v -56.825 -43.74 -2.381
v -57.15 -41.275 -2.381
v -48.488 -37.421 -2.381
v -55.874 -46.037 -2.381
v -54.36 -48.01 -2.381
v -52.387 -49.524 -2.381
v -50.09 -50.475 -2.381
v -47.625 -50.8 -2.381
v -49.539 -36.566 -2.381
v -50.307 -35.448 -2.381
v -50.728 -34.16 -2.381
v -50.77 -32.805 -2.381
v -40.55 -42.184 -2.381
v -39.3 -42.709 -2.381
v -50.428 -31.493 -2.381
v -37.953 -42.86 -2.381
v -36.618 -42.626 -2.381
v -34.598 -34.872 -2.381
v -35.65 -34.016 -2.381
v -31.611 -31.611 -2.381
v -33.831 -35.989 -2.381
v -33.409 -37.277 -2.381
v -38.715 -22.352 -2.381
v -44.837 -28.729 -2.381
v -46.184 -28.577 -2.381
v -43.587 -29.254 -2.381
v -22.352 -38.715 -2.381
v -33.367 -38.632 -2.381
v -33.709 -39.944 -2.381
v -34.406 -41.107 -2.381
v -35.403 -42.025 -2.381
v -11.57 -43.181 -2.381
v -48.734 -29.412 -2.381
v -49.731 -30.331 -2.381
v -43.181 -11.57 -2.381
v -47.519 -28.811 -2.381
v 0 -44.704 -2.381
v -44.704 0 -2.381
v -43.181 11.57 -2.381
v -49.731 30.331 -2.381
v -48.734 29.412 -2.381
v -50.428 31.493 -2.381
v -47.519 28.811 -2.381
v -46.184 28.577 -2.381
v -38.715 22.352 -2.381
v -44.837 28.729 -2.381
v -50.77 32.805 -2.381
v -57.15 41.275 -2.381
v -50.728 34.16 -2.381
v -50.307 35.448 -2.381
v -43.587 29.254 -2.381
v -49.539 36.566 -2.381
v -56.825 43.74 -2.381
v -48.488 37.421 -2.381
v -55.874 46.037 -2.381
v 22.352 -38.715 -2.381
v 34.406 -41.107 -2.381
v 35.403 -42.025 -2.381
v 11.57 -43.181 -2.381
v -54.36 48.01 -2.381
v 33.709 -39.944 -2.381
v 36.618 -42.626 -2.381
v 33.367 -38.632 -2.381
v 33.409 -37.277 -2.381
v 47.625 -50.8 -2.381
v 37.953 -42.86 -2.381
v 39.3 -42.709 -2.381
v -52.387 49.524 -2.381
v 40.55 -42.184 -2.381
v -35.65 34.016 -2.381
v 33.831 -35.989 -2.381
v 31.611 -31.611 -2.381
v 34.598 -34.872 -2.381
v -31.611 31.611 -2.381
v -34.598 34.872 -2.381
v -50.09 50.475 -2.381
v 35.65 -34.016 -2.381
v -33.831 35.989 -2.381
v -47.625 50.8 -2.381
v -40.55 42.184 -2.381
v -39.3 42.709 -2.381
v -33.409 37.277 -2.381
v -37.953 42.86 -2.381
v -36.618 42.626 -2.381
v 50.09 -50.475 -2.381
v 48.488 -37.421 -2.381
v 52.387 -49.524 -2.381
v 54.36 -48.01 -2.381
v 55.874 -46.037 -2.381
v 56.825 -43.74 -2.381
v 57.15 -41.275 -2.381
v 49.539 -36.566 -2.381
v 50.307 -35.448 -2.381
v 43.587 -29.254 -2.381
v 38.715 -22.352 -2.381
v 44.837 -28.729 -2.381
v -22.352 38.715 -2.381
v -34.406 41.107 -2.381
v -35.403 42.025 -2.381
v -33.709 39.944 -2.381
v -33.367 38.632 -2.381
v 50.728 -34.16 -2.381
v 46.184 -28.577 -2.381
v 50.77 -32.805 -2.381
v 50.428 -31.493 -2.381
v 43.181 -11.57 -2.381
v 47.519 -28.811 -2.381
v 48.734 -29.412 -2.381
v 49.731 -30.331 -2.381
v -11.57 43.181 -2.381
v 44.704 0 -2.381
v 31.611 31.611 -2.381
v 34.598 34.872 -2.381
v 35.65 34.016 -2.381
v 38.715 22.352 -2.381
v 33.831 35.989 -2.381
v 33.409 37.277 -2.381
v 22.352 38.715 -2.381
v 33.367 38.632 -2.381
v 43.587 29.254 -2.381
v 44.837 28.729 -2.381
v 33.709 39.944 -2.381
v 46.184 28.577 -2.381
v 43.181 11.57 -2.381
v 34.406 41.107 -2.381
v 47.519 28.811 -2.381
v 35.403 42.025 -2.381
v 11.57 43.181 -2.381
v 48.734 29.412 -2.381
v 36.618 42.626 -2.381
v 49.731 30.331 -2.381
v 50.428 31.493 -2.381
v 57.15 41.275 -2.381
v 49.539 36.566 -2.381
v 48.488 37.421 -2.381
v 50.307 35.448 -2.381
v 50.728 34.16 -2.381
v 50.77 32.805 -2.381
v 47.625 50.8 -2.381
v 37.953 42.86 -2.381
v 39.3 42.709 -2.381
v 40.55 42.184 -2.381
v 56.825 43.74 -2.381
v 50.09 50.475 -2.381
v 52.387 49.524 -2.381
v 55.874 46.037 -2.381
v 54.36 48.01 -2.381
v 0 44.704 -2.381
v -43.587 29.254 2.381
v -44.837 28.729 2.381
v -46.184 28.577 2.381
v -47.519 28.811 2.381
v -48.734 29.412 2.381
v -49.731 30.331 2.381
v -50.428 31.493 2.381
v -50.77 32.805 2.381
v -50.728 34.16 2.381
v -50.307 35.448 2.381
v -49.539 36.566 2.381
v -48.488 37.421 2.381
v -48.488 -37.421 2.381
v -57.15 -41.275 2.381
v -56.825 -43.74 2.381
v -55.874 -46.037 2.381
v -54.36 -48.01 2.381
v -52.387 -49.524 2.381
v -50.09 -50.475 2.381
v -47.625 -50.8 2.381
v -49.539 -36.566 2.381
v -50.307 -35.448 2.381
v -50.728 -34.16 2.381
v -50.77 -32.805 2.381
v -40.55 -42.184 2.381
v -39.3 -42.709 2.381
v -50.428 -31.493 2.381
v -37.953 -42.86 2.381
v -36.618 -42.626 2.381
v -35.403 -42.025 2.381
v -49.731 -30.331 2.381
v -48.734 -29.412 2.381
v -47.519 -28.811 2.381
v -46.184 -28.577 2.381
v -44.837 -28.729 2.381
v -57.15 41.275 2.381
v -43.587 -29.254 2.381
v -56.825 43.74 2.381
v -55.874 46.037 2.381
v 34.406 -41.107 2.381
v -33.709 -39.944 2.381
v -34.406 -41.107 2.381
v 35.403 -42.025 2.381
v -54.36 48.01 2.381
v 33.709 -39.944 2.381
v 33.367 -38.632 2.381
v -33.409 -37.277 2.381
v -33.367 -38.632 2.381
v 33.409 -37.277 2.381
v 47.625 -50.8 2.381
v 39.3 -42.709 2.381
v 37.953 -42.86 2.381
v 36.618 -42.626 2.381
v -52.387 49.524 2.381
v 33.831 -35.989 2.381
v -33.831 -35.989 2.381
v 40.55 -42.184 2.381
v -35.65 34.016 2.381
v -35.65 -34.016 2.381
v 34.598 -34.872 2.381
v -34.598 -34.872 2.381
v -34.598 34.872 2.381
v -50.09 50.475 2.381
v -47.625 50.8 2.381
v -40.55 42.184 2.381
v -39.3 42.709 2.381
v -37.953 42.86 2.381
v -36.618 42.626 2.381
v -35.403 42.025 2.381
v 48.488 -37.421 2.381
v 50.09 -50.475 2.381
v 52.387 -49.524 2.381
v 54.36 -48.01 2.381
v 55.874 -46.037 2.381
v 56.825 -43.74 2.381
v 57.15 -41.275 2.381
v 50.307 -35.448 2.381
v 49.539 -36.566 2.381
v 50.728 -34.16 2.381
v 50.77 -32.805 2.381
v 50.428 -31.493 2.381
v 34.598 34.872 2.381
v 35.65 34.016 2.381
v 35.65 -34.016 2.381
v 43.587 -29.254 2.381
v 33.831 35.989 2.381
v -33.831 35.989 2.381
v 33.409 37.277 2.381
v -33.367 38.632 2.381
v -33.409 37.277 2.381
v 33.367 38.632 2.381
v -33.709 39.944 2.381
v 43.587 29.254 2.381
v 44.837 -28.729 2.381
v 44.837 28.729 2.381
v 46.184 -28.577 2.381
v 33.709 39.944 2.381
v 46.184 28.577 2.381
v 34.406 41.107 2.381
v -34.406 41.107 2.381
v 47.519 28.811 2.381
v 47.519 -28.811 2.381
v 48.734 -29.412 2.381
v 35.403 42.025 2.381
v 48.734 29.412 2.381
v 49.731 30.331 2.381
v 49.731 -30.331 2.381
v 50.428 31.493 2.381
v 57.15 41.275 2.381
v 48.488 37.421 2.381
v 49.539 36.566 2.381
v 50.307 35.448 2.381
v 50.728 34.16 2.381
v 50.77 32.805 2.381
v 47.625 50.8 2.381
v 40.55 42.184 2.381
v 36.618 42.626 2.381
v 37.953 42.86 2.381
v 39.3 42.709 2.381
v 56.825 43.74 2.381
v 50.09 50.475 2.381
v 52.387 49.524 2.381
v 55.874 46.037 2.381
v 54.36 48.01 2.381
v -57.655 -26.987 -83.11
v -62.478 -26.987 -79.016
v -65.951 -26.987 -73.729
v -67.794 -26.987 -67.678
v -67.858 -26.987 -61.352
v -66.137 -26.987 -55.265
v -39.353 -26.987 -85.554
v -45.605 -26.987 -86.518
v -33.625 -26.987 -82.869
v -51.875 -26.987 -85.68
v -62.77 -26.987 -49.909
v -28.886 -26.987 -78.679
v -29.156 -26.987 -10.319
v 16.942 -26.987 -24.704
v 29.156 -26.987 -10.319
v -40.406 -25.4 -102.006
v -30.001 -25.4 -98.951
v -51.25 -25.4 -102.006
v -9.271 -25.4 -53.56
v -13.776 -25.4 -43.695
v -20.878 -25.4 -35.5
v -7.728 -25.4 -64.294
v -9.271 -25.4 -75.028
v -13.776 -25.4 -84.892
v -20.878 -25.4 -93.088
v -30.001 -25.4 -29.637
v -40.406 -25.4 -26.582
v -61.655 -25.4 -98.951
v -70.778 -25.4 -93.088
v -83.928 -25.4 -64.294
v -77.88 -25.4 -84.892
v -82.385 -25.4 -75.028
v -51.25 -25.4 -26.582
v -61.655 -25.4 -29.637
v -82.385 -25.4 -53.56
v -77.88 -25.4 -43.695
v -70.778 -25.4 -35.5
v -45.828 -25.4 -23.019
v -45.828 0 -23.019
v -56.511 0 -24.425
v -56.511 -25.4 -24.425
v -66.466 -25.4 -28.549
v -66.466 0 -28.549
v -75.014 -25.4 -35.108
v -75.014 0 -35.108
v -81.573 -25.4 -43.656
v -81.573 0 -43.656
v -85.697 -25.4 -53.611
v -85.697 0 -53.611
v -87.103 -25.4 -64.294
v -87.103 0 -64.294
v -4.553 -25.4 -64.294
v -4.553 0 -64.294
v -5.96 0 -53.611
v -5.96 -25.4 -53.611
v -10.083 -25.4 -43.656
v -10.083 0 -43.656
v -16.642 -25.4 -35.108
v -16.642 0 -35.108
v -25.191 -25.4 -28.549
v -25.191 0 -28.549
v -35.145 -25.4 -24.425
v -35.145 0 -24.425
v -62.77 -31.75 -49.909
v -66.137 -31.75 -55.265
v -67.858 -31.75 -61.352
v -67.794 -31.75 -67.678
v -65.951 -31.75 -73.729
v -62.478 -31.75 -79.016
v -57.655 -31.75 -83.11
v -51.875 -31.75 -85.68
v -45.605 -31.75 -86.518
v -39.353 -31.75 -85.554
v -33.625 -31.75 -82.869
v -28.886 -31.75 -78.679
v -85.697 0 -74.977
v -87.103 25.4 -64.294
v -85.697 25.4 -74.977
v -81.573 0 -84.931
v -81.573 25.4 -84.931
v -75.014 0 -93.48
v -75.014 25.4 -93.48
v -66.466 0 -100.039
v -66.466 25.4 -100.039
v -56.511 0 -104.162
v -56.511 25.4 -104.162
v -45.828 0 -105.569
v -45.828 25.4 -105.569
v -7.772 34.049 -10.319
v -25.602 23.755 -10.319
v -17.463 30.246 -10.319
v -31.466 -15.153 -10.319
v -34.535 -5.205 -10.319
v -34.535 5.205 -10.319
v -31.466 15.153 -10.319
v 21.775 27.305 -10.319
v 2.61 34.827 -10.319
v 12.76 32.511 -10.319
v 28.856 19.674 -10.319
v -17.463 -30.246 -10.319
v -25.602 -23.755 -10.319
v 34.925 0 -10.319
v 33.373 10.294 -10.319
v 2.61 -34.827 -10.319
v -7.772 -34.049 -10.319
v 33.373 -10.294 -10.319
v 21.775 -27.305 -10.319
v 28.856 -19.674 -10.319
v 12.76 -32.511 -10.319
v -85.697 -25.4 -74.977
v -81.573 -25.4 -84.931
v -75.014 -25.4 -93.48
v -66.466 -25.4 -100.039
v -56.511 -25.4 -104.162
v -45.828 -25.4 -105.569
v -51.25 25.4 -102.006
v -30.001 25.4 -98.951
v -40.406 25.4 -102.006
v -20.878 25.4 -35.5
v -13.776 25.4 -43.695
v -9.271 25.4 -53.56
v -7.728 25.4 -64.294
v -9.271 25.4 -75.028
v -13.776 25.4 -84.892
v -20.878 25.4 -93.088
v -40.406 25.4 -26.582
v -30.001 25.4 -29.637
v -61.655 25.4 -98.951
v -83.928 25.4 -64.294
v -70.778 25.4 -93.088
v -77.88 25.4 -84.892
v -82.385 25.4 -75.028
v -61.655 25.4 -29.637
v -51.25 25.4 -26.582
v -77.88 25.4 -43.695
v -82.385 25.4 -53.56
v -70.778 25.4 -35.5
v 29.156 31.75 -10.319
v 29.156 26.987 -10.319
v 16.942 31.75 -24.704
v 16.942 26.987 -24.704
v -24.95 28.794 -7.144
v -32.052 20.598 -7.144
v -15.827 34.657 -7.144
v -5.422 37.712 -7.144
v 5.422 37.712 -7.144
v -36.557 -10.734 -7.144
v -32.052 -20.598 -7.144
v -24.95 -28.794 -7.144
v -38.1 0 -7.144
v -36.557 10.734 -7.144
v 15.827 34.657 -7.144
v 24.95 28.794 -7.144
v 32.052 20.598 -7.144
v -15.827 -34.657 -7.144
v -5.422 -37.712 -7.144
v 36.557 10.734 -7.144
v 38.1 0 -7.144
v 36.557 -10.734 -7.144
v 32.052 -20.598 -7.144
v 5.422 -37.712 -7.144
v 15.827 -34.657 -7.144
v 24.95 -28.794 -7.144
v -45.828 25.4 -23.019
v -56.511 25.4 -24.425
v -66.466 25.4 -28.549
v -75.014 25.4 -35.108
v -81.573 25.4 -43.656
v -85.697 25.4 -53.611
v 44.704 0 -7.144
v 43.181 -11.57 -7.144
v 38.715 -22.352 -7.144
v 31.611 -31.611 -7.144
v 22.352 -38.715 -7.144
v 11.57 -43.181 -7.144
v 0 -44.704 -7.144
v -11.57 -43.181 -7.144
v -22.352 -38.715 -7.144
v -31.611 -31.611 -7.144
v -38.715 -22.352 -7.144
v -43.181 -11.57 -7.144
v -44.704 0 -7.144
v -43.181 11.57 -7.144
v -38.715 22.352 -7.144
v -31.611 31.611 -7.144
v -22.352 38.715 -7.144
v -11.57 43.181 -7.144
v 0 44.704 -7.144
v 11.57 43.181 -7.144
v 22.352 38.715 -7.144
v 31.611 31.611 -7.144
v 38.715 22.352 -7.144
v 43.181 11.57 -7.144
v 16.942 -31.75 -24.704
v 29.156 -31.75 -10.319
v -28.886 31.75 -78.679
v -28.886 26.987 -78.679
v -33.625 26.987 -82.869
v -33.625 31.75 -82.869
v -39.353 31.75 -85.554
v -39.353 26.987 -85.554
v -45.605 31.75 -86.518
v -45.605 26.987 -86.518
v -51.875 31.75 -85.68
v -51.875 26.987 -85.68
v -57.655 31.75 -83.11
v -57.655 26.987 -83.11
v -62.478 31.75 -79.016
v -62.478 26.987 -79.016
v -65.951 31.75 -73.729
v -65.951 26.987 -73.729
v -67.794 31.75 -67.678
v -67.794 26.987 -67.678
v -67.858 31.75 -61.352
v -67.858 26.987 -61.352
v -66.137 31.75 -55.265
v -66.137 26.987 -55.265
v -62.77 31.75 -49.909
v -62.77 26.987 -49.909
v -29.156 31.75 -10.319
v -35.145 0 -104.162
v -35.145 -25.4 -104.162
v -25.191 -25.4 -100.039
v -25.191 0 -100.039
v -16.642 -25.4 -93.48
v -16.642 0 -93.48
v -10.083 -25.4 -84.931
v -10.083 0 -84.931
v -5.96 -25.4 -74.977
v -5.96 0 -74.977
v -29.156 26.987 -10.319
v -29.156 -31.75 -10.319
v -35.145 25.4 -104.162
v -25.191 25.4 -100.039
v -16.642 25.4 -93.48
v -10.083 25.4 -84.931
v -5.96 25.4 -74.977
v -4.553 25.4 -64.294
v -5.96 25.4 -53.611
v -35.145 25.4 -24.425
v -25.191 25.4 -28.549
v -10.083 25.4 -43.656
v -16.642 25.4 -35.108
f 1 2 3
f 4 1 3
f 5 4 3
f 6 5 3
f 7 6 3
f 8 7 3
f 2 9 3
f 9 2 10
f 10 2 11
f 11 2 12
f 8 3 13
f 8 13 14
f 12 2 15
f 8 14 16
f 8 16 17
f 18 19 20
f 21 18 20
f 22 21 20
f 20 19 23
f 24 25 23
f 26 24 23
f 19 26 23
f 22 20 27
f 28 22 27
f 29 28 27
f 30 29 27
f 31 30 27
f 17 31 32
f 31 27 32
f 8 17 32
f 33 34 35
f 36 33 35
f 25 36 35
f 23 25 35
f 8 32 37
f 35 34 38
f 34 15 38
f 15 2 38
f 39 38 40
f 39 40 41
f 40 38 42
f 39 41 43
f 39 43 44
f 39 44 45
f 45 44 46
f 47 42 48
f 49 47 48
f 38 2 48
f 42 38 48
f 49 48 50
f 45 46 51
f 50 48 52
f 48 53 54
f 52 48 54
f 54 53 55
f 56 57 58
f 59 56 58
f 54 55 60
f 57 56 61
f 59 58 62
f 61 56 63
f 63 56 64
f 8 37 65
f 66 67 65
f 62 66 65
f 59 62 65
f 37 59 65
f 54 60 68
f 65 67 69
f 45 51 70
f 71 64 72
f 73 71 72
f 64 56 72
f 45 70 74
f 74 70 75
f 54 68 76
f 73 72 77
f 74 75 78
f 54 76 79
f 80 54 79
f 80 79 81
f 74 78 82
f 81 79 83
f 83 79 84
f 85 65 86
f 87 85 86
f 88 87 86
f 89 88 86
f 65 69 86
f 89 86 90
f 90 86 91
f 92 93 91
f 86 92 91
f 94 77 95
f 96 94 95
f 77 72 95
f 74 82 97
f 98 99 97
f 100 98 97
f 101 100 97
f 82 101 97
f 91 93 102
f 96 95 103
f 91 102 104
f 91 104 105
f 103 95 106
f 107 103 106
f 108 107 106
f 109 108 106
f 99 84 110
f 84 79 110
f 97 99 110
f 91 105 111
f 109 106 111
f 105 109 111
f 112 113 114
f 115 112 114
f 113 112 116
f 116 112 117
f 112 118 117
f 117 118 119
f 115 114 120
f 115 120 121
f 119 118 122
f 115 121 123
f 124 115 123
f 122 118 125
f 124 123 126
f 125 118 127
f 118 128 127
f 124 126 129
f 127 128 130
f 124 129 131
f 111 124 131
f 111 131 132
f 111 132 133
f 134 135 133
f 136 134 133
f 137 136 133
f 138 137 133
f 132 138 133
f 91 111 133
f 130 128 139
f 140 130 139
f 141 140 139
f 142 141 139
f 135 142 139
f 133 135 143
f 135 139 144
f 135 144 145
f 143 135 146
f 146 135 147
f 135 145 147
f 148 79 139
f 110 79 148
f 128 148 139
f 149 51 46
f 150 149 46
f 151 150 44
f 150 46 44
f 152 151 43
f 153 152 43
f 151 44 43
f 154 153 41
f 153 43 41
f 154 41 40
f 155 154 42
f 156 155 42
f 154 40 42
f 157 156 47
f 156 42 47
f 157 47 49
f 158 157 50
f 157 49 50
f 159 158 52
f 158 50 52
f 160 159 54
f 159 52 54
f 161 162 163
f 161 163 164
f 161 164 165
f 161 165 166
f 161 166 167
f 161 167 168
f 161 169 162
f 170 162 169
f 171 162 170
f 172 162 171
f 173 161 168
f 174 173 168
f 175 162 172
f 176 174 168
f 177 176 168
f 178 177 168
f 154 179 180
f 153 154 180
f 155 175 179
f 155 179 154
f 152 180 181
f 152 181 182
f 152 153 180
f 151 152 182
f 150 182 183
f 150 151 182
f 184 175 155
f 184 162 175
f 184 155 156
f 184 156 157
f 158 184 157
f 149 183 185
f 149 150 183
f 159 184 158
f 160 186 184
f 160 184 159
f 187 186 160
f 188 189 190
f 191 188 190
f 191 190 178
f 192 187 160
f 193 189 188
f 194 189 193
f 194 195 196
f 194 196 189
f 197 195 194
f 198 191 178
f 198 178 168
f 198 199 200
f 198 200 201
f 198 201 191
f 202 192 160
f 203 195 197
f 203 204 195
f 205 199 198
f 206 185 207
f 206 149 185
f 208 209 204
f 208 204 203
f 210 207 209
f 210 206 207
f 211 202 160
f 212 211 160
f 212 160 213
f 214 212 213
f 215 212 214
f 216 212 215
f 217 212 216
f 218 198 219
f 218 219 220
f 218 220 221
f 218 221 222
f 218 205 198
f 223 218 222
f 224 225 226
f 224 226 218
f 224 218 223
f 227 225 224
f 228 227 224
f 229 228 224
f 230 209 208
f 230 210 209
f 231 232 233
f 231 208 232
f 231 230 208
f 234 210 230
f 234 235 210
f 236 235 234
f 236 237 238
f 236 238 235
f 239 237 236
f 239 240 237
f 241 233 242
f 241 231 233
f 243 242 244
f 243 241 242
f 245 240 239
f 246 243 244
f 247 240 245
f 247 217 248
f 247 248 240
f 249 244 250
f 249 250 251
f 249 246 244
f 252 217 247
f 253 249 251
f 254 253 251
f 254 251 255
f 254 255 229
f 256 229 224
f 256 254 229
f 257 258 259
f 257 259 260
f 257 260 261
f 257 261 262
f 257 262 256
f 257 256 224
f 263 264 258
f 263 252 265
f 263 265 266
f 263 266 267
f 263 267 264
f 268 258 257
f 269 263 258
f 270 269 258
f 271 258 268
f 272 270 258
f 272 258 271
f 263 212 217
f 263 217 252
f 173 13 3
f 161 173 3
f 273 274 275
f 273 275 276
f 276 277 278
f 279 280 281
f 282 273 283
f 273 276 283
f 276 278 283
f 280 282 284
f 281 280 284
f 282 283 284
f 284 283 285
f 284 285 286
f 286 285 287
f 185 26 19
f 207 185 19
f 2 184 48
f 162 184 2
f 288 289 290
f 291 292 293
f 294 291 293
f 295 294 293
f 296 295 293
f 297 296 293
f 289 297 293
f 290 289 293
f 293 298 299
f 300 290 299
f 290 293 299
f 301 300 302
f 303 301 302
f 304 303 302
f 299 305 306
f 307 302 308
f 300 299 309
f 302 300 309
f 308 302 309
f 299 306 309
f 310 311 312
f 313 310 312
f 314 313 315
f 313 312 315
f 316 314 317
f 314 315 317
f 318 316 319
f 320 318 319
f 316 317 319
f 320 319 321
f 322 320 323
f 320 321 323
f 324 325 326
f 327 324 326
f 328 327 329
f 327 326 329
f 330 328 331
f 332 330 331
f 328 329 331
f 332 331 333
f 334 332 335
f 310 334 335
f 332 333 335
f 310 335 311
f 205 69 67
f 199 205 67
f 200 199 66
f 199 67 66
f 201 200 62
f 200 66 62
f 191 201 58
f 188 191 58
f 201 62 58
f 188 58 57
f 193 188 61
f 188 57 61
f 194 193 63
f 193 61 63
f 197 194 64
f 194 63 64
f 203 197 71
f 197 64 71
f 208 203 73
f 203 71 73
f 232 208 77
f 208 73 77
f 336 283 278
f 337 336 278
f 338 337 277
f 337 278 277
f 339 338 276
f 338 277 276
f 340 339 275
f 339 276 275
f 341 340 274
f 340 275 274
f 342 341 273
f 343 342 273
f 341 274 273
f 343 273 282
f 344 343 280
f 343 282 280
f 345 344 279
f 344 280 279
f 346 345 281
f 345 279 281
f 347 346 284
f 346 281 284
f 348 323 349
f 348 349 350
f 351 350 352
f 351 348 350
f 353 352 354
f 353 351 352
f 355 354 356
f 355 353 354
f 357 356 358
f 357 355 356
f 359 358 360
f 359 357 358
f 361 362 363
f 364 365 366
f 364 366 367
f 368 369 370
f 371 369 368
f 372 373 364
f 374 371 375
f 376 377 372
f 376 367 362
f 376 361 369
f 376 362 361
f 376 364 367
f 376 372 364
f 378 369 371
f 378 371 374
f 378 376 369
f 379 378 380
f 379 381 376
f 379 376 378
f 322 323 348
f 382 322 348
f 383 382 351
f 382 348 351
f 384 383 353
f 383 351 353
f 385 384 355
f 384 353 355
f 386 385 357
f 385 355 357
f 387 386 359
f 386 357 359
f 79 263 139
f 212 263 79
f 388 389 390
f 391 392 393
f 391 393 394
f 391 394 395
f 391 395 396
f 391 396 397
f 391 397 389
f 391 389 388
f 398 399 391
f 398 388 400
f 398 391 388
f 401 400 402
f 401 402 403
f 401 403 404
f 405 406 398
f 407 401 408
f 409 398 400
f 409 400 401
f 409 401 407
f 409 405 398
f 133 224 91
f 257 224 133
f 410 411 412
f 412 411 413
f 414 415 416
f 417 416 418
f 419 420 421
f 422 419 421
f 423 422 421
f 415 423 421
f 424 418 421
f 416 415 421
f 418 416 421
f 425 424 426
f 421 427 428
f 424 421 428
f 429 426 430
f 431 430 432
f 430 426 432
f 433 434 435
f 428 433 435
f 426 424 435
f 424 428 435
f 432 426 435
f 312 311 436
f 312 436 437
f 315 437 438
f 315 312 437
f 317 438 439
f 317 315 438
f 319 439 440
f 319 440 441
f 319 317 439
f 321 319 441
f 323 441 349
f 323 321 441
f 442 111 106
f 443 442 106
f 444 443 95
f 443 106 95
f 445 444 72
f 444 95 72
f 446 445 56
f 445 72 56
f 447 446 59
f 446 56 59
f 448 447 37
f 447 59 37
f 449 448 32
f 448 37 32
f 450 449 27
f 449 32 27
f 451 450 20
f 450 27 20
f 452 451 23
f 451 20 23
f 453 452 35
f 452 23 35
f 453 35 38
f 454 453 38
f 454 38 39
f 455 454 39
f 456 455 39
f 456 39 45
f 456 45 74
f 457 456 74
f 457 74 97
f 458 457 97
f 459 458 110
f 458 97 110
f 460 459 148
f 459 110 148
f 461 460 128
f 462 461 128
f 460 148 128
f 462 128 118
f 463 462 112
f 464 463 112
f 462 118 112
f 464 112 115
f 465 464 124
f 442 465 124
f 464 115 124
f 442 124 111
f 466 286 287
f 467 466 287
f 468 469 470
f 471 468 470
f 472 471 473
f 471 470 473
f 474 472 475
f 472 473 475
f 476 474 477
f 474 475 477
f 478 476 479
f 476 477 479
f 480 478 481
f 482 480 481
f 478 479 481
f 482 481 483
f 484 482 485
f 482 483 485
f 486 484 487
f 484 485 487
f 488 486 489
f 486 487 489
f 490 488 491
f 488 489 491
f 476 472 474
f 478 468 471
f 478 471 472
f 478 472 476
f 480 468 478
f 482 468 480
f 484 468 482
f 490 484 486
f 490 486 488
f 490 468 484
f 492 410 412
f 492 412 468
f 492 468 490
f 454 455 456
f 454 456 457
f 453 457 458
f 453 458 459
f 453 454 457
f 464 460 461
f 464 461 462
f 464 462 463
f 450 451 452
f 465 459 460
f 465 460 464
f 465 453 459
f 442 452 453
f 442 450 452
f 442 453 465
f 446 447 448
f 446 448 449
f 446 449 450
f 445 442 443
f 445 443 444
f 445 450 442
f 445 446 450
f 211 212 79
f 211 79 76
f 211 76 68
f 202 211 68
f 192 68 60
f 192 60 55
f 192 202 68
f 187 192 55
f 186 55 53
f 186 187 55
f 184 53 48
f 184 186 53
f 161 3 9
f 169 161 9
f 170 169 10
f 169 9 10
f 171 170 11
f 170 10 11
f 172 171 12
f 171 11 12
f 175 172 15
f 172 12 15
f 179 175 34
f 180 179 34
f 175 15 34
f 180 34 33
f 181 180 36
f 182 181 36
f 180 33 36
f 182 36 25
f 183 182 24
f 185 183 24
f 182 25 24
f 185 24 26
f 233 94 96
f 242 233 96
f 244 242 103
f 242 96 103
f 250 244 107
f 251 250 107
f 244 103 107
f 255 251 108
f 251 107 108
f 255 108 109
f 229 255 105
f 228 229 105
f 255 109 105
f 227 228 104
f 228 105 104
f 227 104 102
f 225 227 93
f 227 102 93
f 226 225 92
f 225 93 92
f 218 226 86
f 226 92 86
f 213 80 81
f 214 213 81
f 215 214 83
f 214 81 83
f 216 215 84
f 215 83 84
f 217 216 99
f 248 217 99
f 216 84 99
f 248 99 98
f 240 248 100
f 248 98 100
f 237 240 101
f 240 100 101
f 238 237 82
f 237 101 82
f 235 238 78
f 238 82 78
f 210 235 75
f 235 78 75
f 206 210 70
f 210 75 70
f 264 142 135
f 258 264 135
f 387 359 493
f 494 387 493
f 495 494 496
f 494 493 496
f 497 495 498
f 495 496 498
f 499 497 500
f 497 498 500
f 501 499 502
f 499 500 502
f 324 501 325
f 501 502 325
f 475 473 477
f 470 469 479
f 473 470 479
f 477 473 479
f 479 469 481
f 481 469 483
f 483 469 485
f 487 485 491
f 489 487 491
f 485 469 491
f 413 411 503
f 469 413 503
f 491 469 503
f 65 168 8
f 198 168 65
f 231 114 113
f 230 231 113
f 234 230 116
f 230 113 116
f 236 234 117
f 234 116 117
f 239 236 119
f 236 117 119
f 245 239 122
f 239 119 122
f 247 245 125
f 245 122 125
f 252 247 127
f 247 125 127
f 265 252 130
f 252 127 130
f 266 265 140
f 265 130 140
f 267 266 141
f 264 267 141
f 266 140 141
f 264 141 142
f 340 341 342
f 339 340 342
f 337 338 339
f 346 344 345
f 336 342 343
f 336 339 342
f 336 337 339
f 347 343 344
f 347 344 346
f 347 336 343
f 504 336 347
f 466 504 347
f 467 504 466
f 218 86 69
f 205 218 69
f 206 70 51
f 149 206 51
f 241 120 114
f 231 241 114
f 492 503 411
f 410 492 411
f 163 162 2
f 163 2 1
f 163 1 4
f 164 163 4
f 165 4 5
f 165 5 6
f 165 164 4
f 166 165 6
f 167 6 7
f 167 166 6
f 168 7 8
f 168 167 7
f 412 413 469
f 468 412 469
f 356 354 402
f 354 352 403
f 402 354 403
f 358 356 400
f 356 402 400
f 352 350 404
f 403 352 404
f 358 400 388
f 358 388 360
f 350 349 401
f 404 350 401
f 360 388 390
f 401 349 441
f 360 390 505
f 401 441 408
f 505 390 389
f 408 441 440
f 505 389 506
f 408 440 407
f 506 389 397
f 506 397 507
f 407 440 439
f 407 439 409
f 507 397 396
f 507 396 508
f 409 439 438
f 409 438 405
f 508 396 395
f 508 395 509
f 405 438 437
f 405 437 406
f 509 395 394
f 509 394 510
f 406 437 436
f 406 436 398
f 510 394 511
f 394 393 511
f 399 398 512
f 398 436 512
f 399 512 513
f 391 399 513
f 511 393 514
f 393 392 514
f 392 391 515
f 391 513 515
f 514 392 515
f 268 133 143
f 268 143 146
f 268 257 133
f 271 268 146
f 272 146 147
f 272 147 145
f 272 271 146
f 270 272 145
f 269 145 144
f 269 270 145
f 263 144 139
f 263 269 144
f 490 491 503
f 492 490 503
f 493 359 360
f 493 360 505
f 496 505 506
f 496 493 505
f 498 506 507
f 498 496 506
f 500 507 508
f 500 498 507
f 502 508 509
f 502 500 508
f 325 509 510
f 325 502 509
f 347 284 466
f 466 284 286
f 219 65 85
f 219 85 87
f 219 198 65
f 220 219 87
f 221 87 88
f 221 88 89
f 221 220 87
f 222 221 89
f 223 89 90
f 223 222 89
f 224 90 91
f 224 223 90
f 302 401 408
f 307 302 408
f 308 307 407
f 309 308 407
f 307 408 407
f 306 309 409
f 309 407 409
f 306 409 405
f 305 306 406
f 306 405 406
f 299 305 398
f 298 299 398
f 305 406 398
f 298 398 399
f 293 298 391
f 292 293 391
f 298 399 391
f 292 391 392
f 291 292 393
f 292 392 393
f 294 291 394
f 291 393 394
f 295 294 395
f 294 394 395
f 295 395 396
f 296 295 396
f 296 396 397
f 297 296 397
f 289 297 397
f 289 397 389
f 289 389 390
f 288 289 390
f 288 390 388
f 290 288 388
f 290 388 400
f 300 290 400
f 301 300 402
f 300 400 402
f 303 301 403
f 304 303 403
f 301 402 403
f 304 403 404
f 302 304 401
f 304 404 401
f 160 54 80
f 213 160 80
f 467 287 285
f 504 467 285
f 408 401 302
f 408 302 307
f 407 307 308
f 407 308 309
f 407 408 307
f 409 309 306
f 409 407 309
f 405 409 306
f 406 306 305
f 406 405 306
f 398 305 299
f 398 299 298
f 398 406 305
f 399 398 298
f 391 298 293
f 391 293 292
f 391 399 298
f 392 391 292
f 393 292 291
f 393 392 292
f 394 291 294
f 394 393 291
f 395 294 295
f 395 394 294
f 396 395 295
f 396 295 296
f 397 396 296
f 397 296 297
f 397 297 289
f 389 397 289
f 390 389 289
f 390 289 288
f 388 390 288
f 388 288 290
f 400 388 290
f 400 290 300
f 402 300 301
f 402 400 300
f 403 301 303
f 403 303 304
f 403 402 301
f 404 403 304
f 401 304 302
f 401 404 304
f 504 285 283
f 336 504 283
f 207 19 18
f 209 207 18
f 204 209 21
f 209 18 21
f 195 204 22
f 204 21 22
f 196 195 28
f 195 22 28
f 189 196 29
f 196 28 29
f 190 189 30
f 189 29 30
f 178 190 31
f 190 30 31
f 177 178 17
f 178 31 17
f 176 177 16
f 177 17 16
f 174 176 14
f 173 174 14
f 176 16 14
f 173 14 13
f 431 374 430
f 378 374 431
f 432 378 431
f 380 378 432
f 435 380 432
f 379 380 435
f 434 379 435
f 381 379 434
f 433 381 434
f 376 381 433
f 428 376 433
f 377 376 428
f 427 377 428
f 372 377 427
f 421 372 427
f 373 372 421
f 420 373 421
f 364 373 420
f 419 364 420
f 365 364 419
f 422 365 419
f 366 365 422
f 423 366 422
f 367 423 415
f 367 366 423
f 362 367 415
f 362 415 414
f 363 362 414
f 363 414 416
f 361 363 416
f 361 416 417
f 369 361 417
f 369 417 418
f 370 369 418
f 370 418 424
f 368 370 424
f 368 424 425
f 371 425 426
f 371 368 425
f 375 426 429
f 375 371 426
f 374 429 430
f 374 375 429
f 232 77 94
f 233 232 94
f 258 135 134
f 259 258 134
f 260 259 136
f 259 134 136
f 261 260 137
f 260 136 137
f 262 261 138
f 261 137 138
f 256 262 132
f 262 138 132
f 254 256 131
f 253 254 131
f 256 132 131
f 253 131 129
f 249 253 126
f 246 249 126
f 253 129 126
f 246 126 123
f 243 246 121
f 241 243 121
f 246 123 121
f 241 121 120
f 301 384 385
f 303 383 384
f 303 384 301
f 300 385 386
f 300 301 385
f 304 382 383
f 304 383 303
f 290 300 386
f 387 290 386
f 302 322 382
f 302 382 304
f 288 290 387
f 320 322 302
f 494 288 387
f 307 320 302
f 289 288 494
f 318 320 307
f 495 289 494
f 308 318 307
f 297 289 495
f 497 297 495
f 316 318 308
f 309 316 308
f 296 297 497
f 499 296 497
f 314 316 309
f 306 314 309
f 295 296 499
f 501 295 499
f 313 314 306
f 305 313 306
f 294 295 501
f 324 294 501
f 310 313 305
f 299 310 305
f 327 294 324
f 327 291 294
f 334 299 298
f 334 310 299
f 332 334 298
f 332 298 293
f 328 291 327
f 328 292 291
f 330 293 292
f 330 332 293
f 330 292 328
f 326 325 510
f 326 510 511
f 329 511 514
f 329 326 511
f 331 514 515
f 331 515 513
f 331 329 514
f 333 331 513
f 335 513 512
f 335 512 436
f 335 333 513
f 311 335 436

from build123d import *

# Parameters (mm, degrees)
F1_DEPTH  = 2.38125
F3_DEPTH  = 25.4
F4_R      = 44.704
F5_DEPTH  = 4.7625
F6_R      = 38.1
F7_DEPTH  = 3.175
F8_SIZE   = 3.17499
F10_DEPTH = 25.4
F12_DEPTH = 6.35
F13_DEPTH = 1.5875
F14_R     = 38.1
F15_DEPTH = 50.8
F16_DEPTH = 50.8
F18_DEPTH = 6.35
F19_DEPTH = 1.5875


# Not quite as in the source:
# - a fillet or chamfer is up to 0.001 mm smaller than in the source, because OpenCascade refuses the exact size


with BuildPart() as f1:
    # F0 (on Top) → F1 (new body, symmetric)
    with BuildSketch(Plane.XY):
        with BuildLine():
            ThreePointArc((57.15, 41.275), (54.3601920908, 48.0101920908), (47.625, 50.8))
            Line((47.625, 50.8), (-47.625, 50.8))
            ThreePointArc((-47.625, 50.8), (-54.3601920908, 48.0101920908), (-57.15, 41.275))
            Line((-57.15, 41.275), (-57.15, -41.275))
            ThreePointArc((-57.15, -41.275), (-54.3601920908, -48.0101920908), (-47.625, -50.8))
            Line((-47.625, -50.8), (47.625, -50.8))
            ThreePointArc((47.625, -50.8), (54.3601920908, -48.0101920908), (57.15, -41.275))
            Line((57.15, -41.275), (57.15, 41.275))
        make_face()
    extrude(amount=F1_DEPTH, both=True)

    # F2 (on face) → F3 (cut)
    with BuildSketch(Plane(origin=(0, 0, -2.38125), x_dir=(1, 0, 0), z_dir=(0, 0, -1))):
        with BuildLine():
            Line((-40.5502860352, 42.1838100587), (-48.4877860352, 37.4213100587))
            ThreePointArc((-48.4877860352, 37.4213100587), (-50.1213100587, 30.8872139648), (-43.5872139648, 29.2536899413))
            Line((-43.5872139648, 29.2536899413), (-35.6497139648, 34.0161899413))
            ThreePointArc((-35.6497139648, 34.0161899413), (-34.0161899413, 40.5502860352), (-40.5502860352, 42.1838100587))
        make_face()
        with BuildLine():
            Line((35.6497139648, 34.0161899413), (43.5872139648, 29.2536899413))
            ThreePointArc((43.5872139648, 29.2536899413), (50.1213100587, 30.8872139648), (48.4877860352, 37.4213100587))
            Line((48.4877860352, 37.4213100587), (40.5502860352, 42.1838100587))
            ThreePointArc((40.5502860352, 42.1838100587), (34.0161899413, 40.5502860352), (35.6497139648, 34.0161899413))
        make_face()
        with BuildLine():
            Line((-48.4877860352, -37.4213100587), (-40.5502860352, -42.1838100587))
            ThreePointArc((-40.5502860352, -42.1838100587), (-34.0161899413, -40.5502860352), (-35.6497139648, -34.0161899413))
            Line((-35.6497139648, -34.0161899413), (-43.5872139648, -29.2536899413))
            ThreePointArc((-43.5872139648, -29.2536899413), (-50.1213100587, -30.8872139648), (-48.4877860352, -37.4213100587))
        make_face()
        with BuildLine():
            Line((40.5502860352, -42.1838100587), (48.4877860352, -37.4213100587))
            ThreePointArc((48.4877860352, -37.4213100587), (50.1213100587, -30.8872139648), (43.5872139648, -29.2536899413))
            Line((43.5872139648, -29.2536899413), (35.6497139648, -34.0161899413))
            ThreePointArc((35.6497139648, -34.0161899413), (34.0161899413, -40.5502860352), (40.5502860352, -42.1838100587))
        make_face()
    extrude(amount=-F3_DEPTH, mode=Mode.SUBTRACT)

    # F4 (on face) → F5 (join)
    with BuildSketch(Plane(origin=(0, 0, -2.38125), x_dir=(1, 0, 0), z_dir=(0, 0, -1))):
        Circle(F4_R)
    extrude(amount=F5_DEPTH)


with BuildPart() as f7:
    # F6 (on face) → F7 (new body)
    with BuildSketch(Plane(origin=(0, 0, -7.14375), x_dir=(1, 0, 0), z_dir=(0, 0, -1))):
        Circle(F6_R)
    extrude(amount=F7_DEPTH)

    # F8 (size 3.175 in the source; OpenCascade refuses exactly that, so slightly less here)
    f8_edges = [f7.edges().sort_by_distance(p)[0] for p in [
        (-38.1, 0, -10.31875),
    ]]
    chamfer(f8_edges, length=F8_SIZE)


with BuildPart() as f10:
    # F9 (on Front) → F10 (new body, symmetric)
    with BuildSketch(Plane.XZ):
        with BuildLine():
            ThreePointArc((-45.8281786, -23.01875), (-75.0140109935, -35.1079176065), (-87.1031786, -64.29375))
            Line((-87.1031786, -64.29375), (-45.8281786, -64.29375))
            Line((-45.8281786, -64.29375), (-45.8281786, -23.01875))
        make_face()
        with BuildLine():
            Line((-45.8281786, -64.29375), (-87.1031786, -64.29375))
            ThreePointArc((-87.1031786, -64.29375), (-75.0140109935, -93.4795823935), (-45.8281786, -105.56875))
            Line((-45.8281786, -105.56875), (-45.8281786, -64.29375))
        make_face()
        with BuildLine():
            Line((-45.8281786, -23.01875), (-45.8281786, -64.29375))
            Line((-45.8281786, -64.29375), (-4.5531786, -64.29375))
            ThreePointArc((-4.5531786, -64.29375), (-16.6423462065, -35.1079176065), (-45.8281786, -23.01875))
        make_face()
        with BuildLine():
            Line((-4.5531786, -64.29375), (-45.8281786, -64.29375))
            Line((-45.8281786, -64.29375), (-45.8281786, -105.56875))
            ThreePointArc((-45.8281786, -105.56875), (-16.6423462065, -93.4795823935), (-4.5531786, -64.29375))
        make_face()
    extrude(amount=F10_DEPTH, both=True)

    # F14 (on face) → F15 (cut, through all)
    with BuildSketch(Plane(origin=(0, 25.4, 0), x_dir=(-1, 0, 0), z_dir=(0, 1, 0))):
        with Locations((45.8281786, -64.29375)):
            Circle(F14_R)
    extrude(amount=-F15_DEPTH, mode=Mode.SUBTRACT)


with BuildPart() as f12:
    # F11 (on face) → F12 (new body)
    with BuildSketch(Plane.XZ.offset(25.4)):
        with BuildLine():
            Line((29.1555075522, -10.31875), (-29.1555075522, -10.31875))
            Line((-29.1555075522, -10.31875), (-62.7701105528, -49.9089814337))
            ThreePointArc((-62.7701105528, -49.9089814337), (-60.2129471663, -81.2356819528), (-28.8862466472, -78.6785185663))
            Line((-28.8862466472, -78.6785185663), (16.9419319528, -24.7035185663))
            Line((16.9419319528, -24.7035185663), (29.1555075522, -10.31875))
        make_face()
    extrude(amount=F12_DEPTH)

    # F13 (cut): a face of the model
    f13_faces = [f12.faces().sort_by_distance(p)[0] for p in [
        (-27.0105853212, -25.4, -44.578171556),
    ]]
    extrude(f13_faces, amount=-F13_DEPTH, mode=Mode.SUBTRACT)


with BuildPart() as f16:
    # F14 (on face) → F16 (new body)
    with BuildSketch(Plane(origin=(0, 25.4, 0), x_dir=(-1, 0, 0), z_dir=(0, 1, 0))):
        with Locations((45.8281786, -64.29375)):
            Circle(F14_R)
    extrude(amount=-F16_DEPTH)


with BuildPart() as f18:
    # F17 (on face) → F18 (new body)
    with BuildSketch(Plane(origin=(0, 25.4, 0), x_dir=(-1, 0, 0), z_dir=(0, 1, 0))):
        with BuildLine():
            Line((62.7701105528, -49.9089814337), (42.7407704224, -26.3190490697))
            ThreePointArc((42.7407704224, -26.3190490697), (21.1685753435, -35.2504380808), (8.8569065167, -55.0885862022))
            Line((8.8569065167, -55.0885862022), (28.8862466472, -78.6785185663))
            ThreePointArc((28.8862466472, -78.6785185663), (60.2129471663, -81.2356819528), (62.7701105528, -49.9089814337))
        make_face()
        with BuildLine():
            Line((29.1555075522, -10.31875), (-29.1555075522, -10.31875))
            Line((-29.1555075522, -10.31875), (-16.9419319528, -24.7035185663))
            Line((-16.9419319528, -24.7035185663), (8.8569065167, -55.0885862022))
            ThreePointArc((8.8569065167, -55.0885862022), (21.1685753435, -35.2504380808), (42.7407704224, -26.3190490697))
            Line((42.7407704224, -26.3190490697), (29.1555075522, -10.31875))
        make_face()
    extrude(amount=F18_DEPTH)

    # F19 (cut): a face of the model
    f19_faces = [f18.faces().sort_by_distance(p)[0] for p in [
        (-27.0105853212, 25.4, -44.578171556),
    ]]
    extrude(f19_faces, amount=-F19_DEPTH, mode=Mode.SUBTRACT)


solid = Compound([f1.part, f7.part, f10.part, f12.part, f16.part, f18.part])
